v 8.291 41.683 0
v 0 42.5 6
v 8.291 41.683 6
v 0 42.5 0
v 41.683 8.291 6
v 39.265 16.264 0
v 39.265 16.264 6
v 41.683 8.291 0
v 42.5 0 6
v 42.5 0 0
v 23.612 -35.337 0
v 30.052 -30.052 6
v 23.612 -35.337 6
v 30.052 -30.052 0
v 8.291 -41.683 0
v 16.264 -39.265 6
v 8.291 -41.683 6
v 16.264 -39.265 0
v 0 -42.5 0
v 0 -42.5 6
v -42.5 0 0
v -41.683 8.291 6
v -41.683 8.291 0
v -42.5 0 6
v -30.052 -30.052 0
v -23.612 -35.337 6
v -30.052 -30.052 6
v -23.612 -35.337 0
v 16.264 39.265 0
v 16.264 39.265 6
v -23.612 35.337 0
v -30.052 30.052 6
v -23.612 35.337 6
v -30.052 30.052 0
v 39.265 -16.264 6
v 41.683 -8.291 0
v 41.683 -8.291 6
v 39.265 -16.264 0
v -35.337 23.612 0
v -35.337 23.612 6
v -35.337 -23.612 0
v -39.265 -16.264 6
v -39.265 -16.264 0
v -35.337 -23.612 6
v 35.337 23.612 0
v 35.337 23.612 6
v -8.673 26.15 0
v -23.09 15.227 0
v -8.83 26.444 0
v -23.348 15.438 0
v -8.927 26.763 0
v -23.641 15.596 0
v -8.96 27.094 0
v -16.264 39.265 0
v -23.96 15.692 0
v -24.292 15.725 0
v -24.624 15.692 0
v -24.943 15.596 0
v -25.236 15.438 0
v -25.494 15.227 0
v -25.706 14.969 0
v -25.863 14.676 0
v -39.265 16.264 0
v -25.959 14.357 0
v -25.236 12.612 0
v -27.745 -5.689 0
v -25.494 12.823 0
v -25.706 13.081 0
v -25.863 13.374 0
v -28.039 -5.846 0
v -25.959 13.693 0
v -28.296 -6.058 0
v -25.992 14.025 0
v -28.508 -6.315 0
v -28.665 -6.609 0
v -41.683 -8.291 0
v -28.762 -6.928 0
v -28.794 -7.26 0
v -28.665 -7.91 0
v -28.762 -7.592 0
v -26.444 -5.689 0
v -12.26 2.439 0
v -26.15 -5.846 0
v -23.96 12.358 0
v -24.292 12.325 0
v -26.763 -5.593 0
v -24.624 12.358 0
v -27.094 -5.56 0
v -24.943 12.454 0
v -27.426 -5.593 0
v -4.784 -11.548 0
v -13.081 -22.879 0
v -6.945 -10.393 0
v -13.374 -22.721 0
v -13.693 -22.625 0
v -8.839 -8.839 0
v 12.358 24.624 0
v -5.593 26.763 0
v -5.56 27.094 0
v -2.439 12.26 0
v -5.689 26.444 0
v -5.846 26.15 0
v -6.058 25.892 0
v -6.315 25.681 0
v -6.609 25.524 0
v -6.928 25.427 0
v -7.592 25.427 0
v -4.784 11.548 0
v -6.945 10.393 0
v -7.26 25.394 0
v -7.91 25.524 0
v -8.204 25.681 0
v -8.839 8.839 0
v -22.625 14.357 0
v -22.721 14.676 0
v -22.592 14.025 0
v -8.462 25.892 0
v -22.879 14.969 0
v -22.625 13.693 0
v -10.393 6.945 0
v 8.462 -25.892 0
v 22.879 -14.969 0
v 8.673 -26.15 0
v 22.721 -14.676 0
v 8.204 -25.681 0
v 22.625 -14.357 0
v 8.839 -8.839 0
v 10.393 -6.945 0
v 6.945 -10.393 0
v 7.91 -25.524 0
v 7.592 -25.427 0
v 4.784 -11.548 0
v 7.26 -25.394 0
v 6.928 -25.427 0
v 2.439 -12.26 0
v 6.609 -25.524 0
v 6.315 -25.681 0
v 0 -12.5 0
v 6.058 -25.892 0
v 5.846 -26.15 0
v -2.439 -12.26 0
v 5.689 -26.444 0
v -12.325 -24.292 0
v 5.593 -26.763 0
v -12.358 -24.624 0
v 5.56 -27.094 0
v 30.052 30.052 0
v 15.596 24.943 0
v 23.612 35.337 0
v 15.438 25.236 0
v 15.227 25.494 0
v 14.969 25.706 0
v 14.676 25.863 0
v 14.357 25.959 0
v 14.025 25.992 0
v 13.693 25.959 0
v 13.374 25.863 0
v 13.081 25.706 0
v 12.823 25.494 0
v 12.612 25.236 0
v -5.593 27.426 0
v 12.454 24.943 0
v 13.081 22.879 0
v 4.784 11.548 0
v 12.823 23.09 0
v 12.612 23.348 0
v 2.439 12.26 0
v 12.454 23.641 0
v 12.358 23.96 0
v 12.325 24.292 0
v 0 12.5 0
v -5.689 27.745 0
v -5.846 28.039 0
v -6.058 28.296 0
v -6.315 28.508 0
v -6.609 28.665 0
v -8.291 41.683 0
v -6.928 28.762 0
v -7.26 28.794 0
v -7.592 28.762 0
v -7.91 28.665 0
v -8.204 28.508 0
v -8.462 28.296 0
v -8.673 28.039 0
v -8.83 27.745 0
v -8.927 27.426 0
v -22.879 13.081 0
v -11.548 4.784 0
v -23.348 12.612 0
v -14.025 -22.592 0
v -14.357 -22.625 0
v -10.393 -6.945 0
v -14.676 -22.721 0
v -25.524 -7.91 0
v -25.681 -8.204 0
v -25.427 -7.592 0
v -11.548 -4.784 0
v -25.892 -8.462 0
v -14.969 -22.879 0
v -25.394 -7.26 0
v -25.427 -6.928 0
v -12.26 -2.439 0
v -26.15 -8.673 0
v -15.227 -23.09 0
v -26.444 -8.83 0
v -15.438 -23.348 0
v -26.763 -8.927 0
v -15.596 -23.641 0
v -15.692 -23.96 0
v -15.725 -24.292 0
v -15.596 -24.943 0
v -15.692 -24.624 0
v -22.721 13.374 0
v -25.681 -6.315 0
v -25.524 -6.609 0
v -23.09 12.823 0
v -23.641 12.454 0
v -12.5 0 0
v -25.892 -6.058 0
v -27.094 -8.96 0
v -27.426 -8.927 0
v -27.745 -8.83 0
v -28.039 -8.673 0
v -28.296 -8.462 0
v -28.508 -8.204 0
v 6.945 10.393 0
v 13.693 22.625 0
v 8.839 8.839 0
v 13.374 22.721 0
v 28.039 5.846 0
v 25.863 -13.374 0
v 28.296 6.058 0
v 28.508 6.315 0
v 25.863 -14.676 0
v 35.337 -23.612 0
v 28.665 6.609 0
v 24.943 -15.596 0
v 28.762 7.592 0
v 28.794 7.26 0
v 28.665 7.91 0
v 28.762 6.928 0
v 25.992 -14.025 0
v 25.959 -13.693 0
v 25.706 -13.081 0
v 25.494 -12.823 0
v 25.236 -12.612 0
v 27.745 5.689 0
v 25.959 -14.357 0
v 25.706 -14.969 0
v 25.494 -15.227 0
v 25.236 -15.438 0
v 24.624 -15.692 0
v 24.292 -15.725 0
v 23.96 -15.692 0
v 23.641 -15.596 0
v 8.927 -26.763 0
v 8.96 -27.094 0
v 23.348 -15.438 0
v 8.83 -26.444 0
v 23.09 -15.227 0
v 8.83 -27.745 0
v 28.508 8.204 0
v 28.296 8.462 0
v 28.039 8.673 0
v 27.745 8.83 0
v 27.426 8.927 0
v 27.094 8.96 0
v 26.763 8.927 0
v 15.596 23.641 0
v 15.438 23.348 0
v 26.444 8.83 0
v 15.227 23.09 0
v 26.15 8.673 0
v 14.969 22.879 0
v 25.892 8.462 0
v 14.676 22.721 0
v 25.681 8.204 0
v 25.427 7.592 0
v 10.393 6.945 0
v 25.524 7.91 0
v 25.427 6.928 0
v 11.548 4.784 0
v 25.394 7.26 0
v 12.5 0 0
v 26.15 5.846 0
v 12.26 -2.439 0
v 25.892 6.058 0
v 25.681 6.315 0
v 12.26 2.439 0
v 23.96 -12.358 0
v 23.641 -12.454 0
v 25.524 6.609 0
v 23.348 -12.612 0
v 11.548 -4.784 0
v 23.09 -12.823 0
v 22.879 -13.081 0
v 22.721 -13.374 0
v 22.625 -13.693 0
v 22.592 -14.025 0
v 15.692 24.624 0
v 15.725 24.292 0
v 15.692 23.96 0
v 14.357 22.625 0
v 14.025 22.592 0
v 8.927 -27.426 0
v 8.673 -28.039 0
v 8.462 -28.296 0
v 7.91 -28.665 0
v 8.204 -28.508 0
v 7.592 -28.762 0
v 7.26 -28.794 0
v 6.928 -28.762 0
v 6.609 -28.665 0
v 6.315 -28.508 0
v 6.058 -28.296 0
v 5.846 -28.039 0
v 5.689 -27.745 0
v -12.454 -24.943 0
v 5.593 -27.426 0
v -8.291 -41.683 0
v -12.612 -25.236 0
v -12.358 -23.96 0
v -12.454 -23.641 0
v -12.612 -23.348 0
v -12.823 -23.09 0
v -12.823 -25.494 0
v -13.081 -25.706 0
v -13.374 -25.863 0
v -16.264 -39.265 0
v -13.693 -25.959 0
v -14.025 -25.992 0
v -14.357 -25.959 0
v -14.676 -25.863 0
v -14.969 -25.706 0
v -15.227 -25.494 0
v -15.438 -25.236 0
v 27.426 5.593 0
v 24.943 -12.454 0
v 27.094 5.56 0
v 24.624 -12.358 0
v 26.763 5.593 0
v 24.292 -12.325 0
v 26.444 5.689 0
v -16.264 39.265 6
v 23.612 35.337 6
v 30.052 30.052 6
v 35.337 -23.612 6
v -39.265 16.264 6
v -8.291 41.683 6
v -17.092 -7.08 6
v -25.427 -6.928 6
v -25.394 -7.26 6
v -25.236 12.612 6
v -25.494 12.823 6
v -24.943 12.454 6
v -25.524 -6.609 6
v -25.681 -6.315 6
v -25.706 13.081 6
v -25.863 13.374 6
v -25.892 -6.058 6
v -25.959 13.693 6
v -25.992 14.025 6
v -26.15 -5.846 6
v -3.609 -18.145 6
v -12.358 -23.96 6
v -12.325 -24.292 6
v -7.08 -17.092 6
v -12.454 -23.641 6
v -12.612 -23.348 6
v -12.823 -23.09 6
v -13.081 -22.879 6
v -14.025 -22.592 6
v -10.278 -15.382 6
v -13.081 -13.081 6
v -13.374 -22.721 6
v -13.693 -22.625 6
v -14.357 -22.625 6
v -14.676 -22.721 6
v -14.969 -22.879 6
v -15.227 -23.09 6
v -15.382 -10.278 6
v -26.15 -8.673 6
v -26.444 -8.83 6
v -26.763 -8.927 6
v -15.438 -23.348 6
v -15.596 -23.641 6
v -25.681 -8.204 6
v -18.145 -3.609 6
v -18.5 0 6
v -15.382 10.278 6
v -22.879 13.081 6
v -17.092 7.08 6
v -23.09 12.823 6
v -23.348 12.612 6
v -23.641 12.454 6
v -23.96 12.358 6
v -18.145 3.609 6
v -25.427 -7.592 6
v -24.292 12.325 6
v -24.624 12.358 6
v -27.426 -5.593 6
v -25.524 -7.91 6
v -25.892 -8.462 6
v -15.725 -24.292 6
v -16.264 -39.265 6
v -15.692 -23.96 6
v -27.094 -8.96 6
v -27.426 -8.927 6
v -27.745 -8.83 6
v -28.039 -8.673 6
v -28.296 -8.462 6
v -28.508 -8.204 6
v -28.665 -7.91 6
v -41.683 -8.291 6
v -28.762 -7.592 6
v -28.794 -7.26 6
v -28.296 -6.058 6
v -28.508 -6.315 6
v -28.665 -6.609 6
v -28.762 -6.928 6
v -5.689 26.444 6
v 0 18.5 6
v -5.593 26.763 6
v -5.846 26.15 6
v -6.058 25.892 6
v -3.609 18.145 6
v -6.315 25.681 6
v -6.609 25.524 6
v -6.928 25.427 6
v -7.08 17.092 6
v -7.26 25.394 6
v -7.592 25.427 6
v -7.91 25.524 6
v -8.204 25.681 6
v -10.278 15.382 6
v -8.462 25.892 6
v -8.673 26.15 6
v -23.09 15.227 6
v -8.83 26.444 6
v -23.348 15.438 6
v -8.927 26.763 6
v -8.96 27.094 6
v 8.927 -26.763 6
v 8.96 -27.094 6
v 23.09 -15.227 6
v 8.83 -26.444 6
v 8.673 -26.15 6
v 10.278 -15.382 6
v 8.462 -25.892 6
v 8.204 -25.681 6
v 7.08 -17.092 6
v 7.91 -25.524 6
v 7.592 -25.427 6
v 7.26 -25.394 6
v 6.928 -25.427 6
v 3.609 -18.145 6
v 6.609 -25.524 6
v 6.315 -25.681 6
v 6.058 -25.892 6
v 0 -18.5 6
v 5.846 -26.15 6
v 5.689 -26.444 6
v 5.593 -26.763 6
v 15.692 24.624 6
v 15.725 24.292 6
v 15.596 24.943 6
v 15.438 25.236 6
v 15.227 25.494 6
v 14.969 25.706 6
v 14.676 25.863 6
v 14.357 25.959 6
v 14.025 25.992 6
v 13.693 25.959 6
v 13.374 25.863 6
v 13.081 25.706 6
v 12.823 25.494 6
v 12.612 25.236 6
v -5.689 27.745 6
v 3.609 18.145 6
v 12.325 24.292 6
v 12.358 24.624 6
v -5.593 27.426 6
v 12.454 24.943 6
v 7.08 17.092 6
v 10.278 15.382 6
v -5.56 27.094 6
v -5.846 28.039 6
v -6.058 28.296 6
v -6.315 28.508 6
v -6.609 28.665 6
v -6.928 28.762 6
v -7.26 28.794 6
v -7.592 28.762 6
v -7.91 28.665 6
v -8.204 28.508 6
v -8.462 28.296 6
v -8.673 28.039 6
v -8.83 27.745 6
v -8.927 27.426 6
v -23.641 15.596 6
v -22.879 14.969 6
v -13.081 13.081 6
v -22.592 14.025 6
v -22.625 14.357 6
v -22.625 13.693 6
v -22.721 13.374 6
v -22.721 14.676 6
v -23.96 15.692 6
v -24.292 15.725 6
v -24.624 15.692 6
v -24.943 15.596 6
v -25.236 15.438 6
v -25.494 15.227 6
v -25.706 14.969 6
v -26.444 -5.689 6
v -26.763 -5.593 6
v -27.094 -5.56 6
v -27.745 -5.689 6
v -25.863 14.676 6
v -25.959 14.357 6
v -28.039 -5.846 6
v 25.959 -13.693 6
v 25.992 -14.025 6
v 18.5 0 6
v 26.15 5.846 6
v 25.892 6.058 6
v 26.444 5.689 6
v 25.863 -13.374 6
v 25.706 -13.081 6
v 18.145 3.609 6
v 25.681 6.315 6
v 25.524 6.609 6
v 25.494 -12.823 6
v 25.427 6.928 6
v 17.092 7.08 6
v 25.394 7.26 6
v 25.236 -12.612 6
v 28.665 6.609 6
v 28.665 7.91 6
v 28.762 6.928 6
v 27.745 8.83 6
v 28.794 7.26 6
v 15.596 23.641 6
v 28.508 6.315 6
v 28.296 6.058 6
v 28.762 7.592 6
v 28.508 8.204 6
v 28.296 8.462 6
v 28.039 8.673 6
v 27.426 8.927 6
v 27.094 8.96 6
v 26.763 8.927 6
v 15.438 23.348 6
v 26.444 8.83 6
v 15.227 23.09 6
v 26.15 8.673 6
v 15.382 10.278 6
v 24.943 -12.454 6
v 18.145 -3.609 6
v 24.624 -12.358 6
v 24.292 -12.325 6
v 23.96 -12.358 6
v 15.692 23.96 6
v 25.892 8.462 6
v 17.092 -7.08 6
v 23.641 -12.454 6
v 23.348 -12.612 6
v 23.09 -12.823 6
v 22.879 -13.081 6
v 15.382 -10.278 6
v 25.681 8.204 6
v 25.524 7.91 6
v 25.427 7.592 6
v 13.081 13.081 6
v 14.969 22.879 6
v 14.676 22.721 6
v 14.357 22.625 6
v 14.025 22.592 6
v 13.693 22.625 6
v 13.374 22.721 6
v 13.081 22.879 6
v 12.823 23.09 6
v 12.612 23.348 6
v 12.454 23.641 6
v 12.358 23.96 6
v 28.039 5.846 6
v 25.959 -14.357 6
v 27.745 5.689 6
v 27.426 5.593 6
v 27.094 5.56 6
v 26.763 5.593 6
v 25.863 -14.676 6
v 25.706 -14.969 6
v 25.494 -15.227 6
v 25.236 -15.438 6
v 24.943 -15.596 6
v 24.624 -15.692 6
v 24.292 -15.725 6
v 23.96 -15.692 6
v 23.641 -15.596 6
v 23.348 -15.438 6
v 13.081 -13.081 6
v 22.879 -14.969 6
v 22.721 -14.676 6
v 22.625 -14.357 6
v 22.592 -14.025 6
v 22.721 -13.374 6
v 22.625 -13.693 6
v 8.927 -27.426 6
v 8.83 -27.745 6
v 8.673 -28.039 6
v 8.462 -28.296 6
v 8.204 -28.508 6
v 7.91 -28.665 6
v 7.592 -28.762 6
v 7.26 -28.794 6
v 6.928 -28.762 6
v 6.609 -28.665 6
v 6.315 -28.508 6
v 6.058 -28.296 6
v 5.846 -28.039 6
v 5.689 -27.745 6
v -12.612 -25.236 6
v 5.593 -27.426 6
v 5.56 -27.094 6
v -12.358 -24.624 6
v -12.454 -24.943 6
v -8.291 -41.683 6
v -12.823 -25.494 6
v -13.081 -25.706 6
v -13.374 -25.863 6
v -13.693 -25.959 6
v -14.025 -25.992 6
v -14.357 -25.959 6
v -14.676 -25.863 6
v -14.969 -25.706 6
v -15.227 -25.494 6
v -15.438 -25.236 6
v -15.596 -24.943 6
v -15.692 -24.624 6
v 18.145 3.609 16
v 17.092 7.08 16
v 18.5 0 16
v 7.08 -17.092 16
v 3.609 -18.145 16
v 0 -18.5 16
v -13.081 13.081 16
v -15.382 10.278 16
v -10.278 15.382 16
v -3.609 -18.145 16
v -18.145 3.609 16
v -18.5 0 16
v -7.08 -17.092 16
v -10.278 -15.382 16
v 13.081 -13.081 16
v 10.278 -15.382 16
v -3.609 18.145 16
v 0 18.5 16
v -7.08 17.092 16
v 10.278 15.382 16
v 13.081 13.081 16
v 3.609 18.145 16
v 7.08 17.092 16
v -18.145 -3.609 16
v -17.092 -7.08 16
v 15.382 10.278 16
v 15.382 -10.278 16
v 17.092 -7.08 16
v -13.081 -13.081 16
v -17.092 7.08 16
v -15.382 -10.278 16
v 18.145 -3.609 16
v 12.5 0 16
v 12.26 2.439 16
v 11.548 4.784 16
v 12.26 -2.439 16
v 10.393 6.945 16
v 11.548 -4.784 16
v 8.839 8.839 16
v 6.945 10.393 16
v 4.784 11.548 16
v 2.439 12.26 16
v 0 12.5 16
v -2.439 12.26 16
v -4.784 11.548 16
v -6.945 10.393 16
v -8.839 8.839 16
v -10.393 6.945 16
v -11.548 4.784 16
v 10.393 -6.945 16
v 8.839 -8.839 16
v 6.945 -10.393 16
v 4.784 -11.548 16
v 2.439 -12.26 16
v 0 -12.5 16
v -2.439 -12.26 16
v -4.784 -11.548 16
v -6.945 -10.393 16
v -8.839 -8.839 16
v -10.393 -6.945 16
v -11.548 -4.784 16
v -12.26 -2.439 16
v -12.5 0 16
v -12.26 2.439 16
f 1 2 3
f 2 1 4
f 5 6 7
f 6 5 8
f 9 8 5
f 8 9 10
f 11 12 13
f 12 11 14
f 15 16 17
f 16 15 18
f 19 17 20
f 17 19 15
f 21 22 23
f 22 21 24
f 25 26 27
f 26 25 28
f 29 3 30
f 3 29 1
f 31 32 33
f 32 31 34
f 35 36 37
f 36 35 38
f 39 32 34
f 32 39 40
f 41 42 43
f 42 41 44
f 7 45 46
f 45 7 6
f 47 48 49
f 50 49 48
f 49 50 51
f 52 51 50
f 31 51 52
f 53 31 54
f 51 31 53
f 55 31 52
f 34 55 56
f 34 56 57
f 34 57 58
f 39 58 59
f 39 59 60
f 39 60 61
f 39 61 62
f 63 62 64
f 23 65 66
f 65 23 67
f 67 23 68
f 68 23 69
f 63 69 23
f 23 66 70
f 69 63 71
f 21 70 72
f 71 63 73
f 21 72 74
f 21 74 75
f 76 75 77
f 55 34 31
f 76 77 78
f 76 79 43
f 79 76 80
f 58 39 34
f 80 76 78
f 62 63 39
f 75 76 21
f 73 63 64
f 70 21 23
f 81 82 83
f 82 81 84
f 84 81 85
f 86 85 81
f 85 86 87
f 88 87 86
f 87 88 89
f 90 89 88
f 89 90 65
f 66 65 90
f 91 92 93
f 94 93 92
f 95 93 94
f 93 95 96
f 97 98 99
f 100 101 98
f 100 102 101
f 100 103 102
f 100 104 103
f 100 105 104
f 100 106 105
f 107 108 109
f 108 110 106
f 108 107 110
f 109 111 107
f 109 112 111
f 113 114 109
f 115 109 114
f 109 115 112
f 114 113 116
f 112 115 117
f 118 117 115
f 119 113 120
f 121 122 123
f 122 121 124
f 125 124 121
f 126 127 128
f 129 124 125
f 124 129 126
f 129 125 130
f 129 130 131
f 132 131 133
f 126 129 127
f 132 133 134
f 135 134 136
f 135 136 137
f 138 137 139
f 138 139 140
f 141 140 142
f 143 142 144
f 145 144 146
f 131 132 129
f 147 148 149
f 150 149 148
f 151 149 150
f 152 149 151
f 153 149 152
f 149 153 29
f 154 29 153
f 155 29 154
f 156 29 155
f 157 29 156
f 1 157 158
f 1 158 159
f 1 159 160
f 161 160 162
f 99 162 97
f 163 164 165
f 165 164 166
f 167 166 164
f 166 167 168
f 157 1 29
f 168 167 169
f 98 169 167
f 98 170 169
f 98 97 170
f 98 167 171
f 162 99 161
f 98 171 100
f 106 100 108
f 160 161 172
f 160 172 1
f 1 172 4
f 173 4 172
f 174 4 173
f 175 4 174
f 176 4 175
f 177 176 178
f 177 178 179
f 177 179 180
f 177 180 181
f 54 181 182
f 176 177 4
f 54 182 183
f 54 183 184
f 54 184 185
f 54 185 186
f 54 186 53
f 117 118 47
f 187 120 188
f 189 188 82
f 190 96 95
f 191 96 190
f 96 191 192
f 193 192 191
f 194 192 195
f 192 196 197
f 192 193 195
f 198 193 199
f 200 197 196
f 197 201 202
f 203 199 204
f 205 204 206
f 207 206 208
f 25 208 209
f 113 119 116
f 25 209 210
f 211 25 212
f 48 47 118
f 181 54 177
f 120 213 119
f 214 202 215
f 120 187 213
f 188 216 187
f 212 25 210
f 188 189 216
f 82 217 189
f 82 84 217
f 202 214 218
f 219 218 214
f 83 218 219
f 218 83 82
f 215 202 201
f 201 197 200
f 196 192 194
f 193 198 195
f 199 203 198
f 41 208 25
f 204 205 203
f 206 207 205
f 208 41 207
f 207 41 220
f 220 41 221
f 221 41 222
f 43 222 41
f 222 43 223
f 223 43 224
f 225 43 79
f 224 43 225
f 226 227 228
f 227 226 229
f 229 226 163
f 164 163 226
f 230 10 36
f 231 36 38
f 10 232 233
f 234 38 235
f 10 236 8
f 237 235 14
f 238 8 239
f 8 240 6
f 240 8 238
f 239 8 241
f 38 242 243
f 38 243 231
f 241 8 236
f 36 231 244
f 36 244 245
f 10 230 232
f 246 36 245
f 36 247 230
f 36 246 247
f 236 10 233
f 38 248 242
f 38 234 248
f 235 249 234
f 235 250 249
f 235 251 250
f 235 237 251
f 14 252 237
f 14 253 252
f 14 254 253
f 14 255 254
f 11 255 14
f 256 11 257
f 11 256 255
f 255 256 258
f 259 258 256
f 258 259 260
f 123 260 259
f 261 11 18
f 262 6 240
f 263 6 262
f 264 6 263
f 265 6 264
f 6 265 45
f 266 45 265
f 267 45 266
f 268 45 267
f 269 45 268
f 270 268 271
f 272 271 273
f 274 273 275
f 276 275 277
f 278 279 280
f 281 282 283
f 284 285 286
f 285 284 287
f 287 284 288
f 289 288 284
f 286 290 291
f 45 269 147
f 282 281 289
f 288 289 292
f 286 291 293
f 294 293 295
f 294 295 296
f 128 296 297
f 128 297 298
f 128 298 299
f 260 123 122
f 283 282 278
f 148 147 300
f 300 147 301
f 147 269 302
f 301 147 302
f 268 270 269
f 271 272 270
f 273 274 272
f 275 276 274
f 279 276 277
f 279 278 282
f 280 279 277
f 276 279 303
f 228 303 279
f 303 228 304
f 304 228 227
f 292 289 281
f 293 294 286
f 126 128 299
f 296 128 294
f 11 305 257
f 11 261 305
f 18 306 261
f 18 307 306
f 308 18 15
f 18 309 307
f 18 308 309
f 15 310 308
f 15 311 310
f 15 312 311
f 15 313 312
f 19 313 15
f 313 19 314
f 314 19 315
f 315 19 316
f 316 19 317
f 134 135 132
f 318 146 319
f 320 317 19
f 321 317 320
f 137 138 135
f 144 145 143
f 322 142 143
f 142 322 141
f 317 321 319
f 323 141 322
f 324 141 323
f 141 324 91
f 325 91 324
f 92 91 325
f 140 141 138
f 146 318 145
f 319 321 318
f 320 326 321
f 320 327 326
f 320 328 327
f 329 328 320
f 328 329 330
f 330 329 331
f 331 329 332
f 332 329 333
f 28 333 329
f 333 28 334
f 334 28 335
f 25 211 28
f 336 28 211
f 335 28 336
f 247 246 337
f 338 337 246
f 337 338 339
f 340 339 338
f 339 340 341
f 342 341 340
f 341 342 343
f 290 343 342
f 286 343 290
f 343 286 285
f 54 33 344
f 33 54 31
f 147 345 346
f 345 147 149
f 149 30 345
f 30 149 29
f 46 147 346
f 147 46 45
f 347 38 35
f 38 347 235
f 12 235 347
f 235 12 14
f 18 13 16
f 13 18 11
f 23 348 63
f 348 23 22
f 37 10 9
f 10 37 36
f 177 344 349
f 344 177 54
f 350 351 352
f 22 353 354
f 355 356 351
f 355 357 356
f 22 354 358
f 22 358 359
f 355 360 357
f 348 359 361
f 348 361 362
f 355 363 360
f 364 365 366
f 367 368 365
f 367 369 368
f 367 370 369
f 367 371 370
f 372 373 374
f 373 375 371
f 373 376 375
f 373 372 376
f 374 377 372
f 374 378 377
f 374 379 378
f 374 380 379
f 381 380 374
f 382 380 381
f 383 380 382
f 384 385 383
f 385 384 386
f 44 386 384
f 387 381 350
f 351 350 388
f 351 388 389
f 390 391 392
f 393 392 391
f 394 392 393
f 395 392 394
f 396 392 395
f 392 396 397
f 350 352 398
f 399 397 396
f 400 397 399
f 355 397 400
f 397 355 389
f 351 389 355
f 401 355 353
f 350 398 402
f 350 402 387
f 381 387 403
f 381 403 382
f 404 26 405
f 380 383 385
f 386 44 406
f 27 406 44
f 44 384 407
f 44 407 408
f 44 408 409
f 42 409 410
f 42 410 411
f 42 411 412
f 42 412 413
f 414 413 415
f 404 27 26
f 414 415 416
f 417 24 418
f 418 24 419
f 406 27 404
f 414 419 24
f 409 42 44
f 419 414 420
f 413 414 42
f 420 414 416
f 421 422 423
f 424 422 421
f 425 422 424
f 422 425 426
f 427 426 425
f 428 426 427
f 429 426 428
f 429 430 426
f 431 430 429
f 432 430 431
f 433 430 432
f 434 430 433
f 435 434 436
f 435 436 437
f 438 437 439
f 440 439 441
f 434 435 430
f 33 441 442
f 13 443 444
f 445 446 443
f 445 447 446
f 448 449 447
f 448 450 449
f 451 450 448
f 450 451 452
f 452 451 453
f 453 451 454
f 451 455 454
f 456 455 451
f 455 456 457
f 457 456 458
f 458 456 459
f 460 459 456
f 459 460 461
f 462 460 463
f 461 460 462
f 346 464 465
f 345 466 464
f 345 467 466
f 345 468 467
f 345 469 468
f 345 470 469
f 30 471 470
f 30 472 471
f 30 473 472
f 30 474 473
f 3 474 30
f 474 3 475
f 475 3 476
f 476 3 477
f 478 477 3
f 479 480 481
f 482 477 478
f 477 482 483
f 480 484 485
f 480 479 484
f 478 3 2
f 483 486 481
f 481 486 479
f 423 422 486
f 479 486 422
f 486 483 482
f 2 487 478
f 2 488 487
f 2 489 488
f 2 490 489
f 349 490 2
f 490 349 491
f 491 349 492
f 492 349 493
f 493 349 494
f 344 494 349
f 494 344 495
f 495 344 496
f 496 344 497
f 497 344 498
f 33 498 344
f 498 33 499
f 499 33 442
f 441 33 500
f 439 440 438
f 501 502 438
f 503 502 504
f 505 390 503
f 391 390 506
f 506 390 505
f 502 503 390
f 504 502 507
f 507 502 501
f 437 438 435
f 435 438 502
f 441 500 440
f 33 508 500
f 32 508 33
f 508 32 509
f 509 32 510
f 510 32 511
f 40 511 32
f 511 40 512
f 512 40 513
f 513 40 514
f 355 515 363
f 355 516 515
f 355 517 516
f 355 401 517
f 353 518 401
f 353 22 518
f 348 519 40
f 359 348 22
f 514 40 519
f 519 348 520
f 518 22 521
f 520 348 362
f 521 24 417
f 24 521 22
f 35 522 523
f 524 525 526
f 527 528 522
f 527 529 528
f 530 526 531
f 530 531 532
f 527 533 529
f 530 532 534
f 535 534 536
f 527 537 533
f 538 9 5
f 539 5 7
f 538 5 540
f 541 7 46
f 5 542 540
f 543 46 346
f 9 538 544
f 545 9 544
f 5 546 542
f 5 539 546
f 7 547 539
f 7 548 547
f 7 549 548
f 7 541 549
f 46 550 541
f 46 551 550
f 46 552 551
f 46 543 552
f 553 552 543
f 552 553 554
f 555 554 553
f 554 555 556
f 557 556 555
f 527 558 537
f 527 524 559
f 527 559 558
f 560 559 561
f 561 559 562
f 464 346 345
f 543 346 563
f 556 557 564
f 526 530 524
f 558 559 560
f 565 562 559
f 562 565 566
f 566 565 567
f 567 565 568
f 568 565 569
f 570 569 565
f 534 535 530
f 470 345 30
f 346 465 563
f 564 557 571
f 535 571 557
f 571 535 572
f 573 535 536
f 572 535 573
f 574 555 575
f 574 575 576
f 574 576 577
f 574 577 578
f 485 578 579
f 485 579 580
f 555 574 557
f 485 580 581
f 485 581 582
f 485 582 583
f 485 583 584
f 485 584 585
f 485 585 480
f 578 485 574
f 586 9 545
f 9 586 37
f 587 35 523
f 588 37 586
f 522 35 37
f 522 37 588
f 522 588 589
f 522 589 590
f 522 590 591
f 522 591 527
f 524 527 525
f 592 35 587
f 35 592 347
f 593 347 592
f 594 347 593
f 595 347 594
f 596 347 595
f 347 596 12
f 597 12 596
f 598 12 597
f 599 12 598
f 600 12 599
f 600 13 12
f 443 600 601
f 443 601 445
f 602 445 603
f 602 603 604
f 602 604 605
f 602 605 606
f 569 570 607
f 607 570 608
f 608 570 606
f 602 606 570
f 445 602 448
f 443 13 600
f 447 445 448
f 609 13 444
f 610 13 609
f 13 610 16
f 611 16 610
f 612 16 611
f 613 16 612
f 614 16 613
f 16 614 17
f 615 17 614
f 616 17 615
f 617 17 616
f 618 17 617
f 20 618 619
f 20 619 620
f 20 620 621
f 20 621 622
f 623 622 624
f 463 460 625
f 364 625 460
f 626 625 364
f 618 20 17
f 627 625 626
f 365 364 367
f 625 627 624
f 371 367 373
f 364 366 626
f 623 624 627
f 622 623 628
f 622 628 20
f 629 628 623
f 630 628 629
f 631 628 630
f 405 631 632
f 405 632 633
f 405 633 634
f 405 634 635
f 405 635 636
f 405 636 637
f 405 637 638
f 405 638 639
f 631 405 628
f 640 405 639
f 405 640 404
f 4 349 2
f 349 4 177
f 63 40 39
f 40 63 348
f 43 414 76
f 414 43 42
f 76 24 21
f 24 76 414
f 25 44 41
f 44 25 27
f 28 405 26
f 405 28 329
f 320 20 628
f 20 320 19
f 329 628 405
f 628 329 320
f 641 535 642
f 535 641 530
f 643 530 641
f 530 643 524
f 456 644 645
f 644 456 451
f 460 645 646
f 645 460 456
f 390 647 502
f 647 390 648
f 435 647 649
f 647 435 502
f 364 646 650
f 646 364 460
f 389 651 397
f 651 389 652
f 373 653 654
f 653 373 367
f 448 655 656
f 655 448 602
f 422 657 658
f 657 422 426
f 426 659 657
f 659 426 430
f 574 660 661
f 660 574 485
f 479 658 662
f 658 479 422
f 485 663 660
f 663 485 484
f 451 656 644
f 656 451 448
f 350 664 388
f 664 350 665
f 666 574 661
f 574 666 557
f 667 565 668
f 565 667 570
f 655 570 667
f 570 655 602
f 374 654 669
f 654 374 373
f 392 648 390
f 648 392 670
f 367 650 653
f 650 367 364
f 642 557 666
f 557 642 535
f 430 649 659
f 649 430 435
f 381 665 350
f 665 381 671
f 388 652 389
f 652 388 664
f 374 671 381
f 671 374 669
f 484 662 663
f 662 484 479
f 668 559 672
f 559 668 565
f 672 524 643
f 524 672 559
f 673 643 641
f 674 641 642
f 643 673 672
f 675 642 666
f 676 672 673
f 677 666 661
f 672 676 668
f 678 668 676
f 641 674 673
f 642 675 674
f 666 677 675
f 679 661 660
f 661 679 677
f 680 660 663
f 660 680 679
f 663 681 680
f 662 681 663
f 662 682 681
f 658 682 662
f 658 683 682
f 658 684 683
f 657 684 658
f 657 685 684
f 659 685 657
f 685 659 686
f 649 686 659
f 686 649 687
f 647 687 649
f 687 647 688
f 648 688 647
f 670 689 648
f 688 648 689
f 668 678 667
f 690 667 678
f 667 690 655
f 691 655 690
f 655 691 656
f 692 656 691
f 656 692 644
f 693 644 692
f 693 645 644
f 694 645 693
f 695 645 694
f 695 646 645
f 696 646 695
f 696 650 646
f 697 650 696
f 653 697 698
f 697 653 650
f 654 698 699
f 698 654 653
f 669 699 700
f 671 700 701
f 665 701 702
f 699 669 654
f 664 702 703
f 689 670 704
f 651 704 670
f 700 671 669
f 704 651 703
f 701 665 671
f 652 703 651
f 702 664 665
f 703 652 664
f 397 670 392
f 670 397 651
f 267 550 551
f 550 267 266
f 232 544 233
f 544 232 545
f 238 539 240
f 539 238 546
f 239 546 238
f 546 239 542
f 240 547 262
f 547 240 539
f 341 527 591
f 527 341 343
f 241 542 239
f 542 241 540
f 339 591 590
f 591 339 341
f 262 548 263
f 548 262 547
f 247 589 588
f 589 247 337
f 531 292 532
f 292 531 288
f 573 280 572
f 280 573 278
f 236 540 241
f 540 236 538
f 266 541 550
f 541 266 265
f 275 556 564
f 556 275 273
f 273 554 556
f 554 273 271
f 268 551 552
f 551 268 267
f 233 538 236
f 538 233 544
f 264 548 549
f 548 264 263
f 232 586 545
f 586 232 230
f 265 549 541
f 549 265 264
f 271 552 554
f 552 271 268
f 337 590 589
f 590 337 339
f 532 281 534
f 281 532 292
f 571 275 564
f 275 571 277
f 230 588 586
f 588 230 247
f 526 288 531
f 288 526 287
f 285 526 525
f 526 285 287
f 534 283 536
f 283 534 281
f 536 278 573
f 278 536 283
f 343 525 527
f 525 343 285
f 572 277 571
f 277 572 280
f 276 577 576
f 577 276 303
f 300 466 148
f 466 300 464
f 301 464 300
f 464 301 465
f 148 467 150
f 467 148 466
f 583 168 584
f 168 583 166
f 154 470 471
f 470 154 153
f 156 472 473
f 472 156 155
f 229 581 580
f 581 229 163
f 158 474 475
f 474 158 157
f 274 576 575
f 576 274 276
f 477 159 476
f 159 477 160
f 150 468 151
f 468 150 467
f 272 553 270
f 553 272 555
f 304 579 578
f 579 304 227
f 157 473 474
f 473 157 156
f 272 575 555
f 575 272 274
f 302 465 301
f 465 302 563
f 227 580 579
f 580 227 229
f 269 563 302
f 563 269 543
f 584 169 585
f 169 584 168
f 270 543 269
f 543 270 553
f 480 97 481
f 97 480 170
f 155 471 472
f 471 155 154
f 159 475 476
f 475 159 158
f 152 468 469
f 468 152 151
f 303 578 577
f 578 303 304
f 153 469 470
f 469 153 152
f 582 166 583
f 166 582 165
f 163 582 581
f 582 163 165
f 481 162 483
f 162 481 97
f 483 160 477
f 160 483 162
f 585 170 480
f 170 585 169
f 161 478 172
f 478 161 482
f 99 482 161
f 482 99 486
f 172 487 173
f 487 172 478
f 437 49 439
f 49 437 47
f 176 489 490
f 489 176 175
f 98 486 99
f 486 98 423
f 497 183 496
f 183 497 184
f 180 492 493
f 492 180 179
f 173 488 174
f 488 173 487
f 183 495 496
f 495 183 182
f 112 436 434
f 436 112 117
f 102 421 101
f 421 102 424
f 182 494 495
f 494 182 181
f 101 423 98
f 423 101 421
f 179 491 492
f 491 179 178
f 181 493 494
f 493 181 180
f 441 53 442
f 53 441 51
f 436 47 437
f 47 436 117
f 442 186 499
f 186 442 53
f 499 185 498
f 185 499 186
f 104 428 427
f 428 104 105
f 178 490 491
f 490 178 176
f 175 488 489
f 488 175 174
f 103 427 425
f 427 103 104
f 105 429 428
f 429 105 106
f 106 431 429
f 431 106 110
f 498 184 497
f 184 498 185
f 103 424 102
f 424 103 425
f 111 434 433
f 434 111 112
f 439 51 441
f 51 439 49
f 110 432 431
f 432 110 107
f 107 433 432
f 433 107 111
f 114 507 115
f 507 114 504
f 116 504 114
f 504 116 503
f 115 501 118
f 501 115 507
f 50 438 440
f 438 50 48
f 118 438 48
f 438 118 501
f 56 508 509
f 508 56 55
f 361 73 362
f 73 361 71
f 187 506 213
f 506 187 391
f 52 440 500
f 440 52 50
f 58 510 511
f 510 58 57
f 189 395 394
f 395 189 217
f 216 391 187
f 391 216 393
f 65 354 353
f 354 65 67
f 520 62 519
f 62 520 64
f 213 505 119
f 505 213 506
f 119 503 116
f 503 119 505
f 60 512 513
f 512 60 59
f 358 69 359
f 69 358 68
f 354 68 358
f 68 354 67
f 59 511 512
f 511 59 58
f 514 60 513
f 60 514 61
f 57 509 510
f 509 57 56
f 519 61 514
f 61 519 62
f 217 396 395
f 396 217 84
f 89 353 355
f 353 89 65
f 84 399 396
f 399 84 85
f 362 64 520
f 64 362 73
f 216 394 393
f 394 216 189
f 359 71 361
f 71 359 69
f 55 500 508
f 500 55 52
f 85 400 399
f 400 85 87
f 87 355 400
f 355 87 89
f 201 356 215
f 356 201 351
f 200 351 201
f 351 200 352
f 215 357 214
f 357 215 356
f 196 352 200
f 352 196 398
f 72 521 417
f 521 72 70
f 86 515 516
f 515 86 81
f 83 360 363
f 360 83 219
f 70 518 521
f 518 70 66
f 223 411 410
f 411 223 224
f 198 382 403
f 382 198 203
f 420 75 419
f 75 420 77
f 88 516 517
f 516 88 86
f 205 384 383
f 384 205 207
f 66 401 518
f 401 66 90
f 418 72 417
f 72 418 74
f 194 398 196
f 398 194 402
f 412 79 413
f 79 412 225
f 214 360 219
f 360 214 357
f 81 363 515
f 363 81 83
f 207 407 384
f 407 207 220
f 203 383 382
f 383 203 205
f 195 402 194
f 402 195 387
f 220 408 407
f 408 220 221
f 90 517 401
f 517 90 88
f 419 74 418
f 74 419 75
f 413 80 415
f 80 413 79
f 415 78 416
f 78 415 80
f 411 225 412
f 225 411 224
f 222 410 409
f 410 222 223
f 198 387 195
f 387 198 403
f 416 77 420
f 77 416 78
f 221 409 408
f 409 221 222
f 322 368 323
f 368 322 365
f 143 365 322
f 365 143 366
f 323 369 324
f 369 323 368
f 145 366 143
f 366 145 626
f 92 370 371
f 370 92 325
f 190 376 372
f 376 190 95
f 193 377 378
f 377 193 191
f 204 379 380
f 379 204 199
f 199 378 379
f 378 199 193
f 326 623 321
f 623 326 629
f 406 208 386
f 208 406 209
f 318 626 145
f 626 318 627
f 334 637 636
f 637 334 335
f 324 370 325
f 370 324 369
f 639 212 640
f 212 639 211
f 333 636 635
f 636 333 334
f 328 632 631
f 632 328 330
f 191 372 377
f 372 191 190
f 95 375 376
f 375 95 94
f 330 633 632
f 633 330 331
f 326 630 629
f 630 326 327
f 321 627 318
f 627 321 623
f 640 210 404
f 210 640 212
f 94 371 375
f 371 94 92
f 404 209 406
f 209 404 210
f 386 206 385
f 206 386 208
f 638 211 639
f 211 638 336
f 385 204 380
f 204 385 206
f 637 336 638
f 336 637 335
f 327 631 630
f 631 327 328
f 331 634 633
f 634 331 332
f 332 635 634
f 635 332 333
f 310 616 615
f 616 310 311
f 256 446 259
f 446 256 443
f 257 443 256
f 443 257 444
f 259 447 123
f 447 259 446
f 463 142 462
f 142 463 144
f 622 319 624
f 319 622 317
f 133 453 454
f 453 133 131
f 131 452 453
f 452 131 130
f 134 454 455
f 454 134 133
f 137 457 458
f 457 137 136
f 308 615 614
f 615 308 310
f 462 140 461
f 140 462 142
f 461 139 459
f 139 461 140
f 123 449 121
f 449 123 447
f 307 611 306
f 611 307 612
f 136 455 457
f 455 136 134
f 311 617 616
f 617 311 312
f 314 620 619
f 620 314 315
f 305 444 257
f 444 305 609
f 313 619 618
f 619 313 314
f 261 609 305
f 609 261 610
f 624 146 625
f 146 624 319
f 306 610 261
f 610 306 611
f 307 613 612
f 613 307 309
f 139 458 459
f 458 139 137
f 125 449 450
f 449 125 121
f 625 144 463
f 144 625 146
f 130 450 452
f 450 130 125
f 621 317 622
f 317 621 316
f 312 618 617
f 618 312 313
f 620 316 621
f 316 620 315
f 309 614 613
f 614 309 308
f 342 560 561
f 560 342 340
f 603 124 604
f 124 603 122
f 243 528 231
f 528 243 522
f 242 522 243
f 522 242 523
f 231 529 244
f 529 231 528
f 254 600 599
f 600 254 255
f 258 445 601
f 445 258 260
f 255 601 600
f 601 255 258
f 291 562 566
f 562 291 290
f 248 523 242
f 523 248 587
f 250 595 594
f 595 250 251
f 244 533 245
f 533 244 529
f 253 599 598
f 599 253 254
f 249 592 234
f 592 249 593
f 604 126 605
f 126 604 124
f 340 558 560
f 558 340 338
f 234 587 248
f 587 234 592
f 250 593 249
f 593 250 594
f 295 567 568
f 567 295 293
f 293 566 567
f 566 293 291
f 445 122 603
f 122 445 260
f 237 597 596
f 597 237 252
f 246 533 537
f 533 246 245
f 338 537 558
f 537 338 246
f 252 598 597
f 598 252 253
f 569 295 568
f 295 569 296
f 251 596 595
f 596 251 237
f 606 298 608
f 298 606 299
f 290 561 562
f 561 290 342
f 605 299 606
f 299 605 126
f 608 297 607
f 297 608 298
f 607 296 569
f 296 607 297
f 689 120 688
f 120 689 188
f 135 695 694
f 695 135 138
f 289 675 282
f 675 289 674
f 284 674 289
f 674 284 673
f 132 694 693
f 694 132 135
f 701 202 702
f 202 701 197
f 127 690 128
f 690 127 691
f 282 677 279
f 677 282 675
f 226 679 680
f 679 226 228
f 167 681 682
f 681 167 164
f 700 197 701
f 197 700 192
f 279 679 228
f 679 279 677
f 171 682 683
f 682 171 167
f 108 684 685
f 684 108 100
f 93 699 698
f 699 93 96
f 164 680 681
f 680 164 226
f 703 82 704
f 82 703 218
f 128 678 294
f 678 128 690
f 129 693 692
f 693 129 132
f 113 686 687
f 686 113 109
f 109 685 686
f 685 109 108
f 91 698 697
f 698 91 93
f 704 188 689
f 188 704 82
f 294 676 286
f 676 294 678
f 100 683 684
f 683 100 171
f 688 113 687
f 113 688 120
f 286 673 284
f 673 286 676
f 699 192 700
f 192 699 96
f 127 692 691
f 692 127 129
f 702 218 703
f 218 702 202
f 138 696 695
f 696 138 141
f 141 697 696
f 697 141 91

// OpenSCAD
$fn = 32;

// ----------------------------------------------------------------------
// Flange Ø85 x 6
// 8 holes on a Ø56.1 bolt circle, bolted joints
// ----------------------------------------------------------------------

// --- parameters (mm) ---
flange_d = 85;   // outside diameter of the flange
thickness = 6;   // flange thickness
holes = 8;       // number of bolt holes
pcd = 56.1;      // bolt circle diameter
start_deg = 15;  // angle of the first hole, from +X
hole_d = 3.4;    // bolt hole diameter
bore_d = 25;     // central through bore
hub_d = 37;      // hub outside diameter
hub_h = 10;      // hub height above the flange face (0 = no hub)

// --- derived feature positions (mm) ---
height = thickness + hub_h;  // = 16   overall height of the part
pcd_r = pcd / 2;             // = 28.05   bolt circle radius
hole_step = 360 / holes;     // = 45   angular pitch
feature_centers = [
  [pcd_r * cos(start_deg + 0 * hole_step), pcd_r * sin(start_deg + 0 * hole_step)],
  [pcd_r * cos(start_deg + 1 * hole_step), pcd_r * sin(start_deg + 1 * hole_step)],
  [pcd_r * cos(start_deg + 2 * hole_step), pcd_r * sin(start_deg + 2 * hole_step)],
  [pcd_r * cos(start_deg + 3 * hole_step), pcd_r * sin(start_deg + 3 * hole_step)],
  [pcd_r * cos(start_deg + 4 * hole_step), pcd_r * sin(start_deg + 4 * hole_step)],
  [pcd_r * cos(start_deg + 5 * hole_step), pcd_r * sin(start_deg + 5 * hole_step)],
  [pcd_r * cos(start_deg + 6 * hole_step), pcd_r * sin(start_deg + 6 * hole_step)],
  [pcd_r * cos(start_deg + 7 * hole_step), pcd_r * sin(start_deg + 7 * hole_step)]
];   // bolt hole centres on the pitch circle

// flange disc, every hole and the bore cut straight through
difference() {
  union() {
    cylinder(d = flange_d, h = thickness);
    cylinder(d = hub_d, h = height);  // hub, overlapped into the flange
  }
  translate([0, 0, -1]) cylinder(d = bore_d, h = height + 2);  // bore, through
  for (centre = feature_centers)
    translate([centre[0], centre[1], -1]) cylinder(d = hole_d, h = thickness + 2);
}
